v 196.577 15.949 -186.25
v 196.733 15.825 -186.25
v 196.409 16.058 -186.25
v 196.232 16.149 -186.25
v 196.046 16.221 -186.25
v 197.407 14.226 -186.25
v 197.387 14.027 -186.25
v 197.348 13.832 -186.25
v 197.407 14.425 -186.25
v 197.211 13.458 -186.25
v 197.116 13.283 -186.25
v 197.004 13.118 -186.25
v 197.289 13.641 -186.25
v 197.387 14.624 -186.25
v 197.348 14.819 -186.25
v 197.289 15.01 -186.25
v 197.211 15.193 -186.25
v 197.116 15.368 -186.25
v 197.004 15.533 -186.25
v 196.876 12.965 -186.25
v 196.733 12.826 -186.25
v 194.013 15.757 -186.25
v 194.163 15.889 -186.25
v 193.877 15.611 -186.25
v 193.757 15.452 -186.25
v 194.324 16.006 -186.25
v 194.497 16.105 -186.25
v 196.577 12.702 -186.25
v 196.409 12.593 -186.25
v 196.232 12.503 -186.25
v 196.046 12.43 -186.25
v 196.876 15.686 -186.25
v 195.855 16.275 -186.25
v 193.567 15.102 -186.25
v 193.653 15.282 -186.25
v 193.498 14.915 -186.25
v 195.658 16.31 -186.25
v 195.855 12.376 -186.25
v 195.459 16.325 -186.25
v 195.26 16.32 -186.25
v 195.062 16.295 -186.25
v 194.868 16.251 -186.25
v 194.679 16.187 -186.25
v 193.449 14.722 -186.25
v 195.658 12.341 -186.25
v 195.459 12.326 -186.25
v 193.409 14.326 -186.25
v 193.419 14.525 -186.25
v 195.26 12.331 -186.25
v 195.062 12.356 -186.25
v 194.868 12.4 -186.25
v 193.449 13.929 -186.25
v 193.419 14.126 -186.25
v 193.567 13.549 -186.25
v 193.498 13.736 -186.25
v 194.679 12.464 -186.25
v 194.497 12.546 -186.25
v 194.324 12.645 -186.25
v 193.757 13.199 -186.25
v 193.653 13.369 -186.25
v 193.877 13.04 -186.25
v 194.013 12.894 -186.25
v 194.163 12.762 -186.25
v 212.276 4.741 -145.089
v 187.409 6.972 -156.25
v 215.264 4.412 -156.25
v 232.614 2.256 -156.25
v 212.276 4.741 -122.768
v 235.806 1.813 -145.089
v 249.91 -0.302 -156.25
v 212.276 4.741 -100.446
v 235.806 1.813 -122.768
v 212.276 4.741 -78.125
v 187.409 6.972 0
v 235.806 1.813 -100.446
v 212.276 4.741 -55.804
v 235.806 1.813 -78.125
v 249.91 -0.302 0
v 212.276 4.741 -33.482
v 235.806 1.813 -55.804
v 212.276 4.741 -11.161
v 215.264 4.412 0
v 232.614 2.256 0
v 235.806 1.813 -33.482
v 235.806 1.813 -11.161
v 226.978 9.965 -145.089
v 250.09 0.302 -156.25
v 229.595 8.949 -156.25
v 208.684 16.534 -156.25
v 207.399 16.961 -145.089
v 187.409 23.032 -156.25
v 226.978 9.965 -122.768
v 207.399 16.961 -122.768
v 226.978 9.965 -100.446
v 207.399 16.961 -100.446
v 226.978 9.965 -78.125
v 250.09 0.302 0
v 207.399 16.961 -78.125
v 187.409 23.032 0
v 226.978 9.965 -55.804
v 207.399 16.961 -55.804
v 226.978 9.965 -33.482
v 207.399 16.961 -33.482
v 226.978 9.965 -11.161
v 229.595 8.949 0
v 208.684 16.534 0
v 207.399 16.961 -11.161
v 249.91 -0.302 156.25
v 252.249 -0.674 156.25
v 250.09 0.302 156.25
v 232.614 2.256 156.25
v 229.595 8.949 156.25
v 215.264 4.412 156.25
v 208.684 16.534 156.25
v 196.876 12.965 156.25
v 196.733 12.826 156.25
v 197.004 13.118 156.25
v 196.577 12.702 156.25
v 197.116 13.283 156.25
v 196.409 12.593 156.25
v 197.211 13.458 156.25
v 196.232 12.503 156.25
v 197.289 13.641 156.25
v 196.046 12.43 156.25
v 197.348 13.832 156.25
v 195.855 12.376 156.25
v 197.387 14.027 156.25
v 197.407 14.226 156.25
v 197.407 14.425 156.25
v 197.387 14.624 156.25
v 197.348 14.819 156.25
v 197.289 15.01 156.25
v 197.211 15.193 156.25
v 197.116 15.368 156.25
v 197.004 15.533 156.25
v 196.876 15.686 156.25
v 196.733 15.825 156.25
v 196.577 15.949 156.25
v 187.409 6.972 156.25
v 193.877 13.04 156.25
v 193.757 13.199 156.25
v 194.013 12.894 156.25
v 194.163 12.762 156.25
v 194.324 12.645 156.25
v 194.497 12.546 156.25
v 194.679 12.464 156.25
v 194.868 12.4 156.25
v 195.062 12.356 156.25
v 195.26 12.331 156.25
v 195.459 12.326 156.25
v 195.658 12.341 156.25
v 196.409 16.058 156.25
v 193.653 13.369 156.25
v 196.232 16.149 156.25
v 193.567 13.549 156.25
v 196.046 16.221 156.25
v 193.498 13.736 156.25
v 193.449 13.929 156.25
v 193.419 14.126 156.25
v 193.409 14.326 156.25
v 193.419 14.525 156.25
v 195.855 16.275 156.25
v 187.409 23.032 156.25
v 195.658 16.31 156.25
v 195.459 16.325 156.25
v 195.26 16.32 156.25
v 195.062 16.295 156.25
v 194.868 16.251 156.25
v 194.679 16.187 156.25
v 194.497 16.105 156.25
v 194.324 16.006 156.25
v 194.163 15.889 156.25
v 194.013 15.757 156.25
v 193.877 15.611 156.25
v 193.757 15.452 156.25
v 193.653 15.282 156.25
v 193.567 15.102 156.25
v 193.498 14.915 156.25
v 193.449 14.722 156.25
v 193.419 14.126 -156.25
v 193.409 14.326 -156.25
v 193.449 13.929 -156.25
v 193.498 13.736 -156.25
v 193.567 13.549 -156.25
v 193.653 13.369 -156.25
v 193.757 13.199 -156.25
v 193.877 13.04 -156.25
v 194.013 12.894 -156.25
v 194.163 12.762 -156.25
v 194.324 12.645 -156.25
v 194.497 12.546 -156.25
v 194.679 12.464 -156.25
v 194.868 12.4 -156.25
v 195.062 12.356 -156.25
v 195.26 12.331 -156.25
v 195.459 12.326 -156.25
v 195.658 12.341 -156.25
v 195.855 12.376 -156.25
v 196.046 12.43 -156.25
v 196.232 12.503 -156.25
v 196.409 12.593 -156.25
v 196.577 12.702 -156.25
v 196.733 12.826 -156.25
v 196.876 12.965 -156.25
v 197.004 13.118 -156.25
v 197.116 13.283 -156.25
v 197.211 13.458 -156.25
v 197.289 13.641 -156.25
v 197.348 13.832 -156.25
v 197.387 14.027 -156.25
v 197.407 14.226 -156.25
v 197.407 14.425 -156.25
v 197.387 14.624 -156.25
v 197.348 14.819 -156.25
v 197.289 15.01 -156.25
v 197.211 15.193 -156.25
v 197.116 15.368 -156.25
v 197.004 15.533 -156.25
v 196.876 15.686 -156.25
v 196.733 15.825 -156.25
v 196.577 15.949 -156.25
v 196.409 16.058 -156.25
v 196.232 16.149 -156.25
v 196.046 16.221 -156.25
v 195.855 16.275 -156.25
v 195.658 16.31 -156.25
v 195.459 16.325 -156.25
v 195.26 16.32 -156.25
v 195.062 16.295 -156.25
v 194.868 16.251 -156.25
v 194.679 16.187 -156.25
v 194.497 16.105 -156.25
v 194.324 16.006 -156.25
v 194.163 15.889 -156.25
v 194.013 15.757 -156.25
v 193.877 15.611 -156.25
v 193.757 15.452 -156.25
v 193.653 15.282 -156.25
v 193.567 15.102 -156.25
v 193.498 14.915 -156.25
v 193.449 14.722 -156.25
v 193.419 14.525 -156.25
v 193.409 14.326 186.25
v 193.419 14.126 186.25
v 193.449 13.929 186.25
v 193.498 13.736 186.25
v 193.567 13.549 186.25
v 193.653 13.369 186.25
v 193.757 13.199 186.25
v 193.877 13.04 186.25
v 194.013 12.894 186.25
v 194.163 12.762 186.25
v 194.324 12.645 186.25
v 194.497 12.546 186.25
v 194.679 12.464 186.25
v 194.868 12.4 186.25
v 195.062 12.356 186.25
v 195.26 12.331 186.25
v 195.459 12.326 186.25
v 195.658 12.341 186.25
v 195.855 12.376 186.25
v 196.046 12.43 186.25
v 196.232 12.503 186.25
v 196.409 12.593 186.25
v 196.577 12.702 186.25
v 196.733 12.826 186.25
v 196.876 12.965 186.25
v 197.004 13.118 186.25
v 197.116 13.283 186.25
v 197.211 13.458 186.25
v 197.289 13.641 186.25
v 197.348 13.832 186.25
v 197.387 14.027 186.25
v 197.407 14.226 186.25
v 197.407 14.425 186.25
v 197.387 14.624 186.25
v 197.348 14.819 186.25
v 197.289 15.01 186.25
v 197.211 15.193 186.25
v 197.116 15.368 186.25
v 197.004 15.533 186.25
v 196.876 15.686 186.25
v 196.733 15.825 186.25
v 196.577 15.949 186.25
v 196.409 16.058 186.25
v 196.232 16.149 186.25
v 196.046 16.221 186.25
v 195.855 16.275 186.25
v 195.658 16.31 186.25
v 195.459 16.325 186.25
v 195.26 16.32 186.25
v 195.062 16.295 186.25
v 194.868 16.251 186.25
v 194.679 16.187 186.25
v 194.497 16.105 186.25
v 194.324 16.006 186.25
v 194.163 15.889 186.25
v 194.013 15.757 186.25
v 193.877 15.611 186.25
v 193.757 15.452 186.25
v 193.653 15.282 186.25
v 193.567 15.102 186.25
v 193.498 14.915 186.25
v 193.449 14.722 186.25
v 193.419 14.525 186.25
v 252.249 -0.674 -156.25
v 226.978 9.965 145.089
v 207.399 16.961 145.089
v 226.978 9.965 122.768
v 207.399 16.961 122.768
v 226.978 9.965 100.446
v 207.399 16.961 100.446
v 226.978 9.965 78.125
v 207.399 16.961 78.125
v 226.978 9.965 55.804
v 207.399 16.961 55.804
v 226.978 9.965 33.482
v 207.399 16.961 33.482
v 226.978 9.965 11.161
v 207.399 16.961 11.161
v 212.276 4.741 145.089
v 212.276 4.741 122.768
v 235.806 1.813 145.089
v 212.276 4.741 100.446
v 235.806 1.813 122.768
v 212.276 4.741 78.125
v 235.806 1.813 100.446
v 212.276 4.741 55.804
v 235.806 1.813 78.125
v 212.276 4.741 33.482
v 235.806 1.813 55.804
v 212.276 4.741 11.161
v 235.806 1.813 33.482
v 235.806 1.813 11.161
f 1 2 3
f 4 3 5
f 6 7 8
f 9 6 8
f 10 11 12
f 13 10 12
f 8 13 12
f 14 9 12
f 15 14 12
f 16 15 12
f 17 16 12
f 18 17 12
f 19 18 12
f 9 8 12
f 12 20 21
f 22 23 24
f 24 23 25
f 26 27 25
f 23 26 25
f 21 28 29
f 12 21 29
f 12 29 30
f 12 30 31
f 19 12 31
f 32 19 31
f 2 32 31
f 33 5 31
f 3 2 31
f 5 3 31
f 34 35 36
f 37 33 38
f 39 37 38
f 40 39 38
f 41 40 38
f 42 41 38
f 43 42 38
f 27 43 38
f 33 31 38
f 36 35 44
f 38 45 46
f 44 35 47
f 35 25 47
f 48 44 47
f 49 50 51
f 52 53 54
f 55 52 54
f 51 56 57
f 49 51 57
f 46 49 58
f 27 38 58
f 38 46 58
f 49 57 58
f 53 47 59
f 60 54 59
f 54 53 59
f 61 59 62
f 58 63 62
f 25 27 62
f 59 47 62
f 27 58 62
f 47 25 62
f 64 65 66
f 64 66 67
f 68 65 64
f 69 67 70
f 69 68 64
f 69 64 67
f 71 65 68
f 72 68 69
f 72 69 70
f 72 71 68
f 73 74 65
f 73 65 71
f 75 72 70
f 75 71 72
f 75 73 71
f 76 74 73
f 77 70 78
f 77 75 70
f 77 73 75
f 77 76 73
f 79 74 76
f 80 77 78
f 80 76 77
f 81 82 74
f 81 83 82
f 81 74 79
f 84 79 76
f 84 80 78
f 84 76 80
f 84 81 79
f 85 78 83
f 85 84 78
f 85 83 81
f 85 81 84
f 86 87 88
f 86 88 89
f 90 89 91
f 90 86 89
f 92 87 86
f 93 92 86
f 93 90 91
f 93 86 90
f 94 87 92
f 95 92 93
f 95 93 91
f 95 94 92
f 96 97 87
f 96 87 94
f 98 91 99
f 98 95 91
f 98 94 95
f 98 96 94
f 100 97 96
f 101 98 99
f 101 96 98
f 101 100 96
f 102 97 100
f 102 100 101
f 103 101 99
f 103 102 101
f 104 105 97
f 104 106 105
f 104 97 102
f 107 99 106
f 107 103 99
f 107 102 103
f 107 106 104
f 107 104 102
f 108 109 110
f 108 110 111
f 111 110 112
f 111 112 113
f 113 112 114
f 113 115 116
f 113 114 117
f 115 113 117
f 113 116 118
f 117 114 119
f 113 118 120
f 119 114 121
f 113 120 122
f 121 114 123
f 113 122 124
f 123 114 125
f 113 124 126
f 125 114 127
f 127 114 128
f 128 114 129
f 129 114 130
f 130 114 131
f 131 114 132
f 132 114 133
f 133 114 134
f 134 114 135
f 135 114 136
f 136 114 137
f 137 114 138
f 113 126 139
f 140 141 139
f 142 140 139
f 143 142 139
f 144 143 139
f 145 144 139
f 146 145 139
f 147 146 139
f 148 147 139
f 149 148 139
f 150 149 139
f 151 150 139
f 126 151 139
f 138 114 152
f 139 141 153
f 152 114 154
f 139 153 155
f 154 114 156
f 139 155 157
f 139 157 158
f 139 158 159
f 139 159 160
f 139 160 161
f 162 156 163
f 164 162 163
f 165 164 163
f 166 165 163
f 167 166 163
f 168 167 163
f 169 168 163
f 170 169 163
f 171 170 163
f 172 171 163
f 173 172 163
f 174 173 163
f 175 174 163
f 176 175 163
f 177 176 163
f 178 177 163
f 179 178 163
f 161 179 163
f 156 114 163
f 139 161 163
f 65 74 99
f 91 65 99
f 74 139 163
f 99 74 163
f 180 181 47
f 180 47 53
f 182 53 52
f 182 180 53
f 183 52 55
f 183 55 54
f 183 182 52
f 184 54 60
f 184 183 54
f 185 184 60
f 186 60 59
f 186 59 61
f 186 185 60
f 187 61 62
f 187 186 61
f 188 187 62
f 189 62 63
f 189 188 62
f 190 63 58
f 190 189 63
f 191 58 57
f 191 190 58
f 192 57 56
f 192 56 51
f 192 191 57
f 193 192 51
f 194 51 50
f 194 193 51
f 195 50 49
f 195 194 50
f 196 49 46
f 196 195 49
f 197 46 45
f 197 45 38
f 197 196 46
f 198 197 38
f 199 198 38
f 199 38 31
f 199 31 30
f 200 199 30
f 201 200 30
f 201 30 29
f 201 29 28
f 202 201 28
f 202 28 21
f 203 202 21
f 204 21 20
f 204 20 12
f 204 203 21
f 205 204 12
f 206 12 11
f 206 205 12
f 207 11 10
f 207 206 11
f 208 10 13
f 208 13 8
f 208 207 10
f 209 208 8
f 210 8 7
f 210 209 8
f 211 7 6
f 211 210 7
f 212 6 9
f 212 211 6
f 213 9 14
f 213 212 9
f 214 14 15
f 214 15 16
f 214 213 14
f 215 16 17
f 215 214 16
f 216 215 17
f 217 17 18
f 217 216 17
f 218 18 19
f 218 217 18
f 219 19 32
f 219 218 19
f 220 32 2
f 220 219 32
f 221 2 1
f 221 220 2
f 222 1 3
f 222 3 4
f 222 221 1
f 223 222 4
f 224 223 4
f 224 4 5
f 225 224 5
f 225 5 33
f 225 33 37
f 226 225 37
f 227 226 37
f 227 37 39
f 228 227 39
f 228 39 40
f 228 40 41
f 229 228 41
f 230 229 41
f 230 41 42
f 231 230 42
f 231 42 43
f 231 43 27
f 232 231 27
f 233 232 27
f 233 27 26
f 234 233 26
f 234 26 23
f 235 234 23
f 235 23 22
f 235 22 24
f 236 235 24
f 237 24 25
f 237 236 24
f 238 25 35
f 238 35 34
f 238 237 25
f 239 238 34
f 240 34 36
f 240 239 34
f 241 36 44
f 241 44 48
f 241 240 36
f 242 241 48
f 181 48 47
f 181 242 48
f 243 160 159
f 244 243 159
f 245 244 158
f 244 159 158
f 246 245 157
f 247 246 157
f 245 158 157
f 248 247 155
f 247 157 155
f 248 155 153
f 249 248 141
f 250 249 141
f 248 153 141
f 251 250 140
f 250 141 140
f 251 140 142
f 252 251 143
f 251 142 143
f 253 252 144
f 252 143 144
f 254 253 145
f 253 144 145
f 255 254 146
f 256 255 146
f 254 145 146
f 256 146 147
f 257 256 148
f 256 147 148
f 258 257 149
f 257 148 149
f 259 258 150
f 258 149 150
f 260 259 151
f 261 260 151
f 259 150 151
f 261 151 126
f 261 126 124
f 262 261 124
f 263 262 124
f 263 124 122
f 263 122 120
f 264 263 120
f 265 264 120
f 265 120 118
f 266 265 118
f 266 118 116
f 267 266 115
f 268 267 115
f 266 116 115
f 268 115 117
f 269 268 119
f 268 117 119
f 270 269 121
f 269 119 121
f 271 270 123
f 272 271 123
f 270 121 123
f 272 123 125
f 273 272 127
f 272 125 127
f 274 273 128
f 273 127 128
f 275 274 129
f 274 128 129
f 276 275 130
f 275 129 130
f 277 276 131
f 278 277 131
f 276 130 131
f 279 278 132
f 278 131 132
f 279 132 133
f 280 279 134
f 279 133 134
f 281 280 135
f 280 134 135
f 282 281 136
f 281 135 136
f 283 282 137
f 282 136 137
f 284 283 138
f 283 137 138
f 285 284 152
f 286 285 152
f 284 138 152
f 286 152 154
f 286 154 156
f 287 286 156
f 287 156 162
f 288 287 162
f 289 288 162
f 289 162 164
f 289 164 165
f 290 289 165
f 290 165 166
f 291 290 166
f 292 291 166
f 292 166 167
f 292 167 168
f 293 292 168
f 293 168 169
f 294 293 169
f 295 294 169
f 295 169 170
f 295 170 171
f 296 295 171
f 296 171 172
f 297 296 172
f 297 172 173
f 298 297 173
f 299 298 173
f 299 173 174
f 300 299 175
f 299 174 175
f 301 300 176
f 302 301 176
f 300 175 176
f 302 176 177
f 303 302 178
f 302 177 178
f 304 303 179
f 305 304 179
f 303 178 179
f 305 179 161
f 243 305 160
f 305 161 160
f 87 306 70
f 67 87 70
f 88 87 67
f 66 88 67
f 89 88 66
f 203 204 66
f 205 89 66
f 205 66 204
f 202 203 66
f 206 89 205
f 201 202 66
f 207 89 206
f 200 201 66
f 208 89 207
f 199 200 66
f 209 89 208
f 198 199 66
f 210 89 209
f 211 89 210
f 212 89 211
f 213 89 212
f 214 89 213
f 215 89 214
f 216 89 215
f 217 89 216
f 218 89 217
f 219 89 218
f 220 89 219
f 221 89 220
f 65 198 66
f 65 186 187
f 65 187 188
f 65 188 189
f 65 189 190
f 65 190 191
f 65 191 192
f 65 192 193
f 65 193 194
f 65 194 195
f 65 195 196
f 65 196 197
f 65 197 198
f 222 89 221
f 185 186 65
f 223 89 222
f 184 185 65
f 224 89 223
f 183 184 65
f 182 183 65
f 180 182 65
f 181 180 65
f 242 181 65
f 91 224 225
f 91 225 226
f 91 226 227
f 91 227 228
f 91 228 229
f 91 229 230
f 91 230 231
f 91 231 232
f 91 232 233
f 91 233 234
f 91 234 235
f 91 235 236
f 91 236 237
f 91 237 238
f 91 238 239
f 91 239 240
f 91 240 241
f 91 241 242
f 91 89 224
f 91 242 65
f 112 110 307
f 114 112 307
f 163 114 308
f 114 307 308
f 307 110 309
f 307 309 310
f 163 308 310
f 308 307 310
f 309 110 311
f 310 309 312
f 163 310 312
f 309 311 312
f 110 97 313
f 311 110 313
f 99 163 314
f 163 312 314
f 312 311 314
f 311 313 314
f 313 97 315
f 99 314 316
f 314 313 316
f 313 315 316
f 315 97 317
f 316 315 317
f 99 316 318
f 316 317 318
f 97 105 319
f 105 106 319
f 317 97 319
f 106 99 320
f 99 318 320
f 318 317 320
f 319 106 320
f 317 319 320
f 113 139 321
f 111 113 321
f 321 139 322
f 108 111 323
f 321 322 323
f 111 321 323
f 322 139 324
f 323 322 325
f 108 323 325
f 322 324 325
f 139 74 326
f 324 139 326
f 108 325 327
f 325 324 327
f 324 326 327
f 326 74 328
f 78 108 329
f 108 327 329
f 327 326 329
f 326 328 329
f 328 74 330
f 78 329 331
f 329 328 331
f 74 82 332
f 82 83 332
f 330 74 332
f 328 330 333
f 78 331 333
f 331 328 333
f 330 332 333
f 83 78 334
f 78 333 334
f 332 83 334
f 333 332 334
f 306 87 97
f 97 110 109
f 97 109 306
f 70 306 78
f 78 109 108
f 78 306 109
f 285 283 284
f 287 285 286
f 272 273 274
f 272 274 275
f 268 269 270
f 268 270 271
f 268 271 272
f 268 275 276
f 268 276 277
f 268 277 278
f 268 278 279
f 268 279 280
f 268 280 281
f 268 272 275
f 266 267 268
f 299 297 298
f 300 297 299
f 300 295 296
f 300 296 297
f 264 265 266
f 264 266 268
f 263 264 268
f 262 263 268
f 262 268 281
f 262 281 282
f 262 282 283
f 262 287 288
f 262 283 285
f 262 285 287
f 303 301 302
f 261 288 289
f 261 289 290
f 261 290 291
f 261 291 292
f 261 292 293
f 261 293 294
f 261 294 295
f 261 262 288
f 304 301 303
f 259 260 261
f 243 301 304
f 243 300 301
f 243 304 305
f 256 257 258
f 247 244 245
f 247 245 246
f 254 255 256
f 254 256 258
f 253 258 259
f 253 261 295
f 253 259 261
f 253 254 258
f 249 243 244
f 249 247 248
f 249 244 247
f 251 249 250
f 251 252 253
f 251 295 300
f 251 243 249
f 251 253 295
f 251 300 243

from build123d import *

# Parameters (mm, degrees)
BOSS_EXTRUDE1_DEPTH = 156.25
SKETCH2_R           = 2
BOSS_EXTRUDE2_DEPTH = 30


with BuildPart() as part:
    # Sketch1 → Boss-Extrude1 (new, symmetric)
    with BuildSketch(Plane.XY):
        with BuildLine():
            Line((250.0905, 0.30175), (252.249073162, -0.674460576))
            Line((252.249073162, -0.674460576), (249.9095, -0.30175))
            add(Edge.make_bspline(
                [(187.409499992, 6.97162784), (187.926542579, 6.93467422), (191.182721922, 6.698224302), (197.036321835, 6.230878489), (204.808324469, 5.519375072), (212.104795112, 4.771105754), (218.875568902, 4.008381966), (225.073163798, 3.252618397), (230.65359628, 2.526708522), (235.57661183, 1.850436242), (239.806204059, 1.243618912), (243.311102366, 0.722290418), (246.065118996, 0.301639985), (248.047511403, -0.006998185), (249.243010727, -0.195573538), (249.776002712, -0.280482936), (249.9095, -0.30175)],
                knots=[0.879031338, 0.879031338, 0.879031338, 0.879031338, 0.882020077, 0.897855052, 0.912888481, 0.927018156, 0.940144762, 0.952173577, 0.963016384, 0.97259107, 0.980824956, 0.987652854, 0.993021794, 0.996888135, 0.999220578, 1, 1, 1, 1], degree=3))
            Line((187.409499992, 6.97162784), (187.409499992, 23.031618348))
            add(Edge.make_bspline(
                [(250.0905, 0.30175), (249.967176894, 0.357522638), (249.474705499, 0.580241883), (248.368757841, 1.077478413), (246.531056029, 1.895578453), (243.970022782, 3.018717316), (240.697484766, 4.425321678), (236.728718064, 6.08814206), (232.083205178, 7.976570158), (226.783347758, 10.054370405), (220.856263164, 12.28446326), (214.332179959, 14.625376483), (207.245873814, 17.035839108), (199.635416935, 19.472597931), (192.963027463, 21.469209577), (188.829830843, 22.637983802), (187.409499992, 23.031618348)],
                knots=[0, 0, 0, 0, 0.000780389, 0.003116359, 0.00699149, 0.012378647, 0.019240165, 0.027529116, 0.037188568, 0.048153015, 0.060350466, 0.073700476, 0.088115901, 0.103505481, 0.119772438, 0.128270281, 0.128270281, 0.128270281, 0.128270281], degree=3))
        make_face()
    extrude(amount=BOSS_EXTRUDE1_DEPTH, both=True)

    # Sketch2 → Boss-Extrude2 (add)
    with BuildSketch(Plane.XY.offset(156.25)):
        with Locations(Location((195.409499992, 14.325539424, 0), (0, 0, 180))):
            Circle(SKETCH2_R)
    boss_extrude2 = extrude(amount=BOSS_EXTRUDE2_DEPTH)

    # Mirror1: Boss-Extrude2 across plane
    add(boss_extrude2.mirror(Plane.XY))


solid = part.part
